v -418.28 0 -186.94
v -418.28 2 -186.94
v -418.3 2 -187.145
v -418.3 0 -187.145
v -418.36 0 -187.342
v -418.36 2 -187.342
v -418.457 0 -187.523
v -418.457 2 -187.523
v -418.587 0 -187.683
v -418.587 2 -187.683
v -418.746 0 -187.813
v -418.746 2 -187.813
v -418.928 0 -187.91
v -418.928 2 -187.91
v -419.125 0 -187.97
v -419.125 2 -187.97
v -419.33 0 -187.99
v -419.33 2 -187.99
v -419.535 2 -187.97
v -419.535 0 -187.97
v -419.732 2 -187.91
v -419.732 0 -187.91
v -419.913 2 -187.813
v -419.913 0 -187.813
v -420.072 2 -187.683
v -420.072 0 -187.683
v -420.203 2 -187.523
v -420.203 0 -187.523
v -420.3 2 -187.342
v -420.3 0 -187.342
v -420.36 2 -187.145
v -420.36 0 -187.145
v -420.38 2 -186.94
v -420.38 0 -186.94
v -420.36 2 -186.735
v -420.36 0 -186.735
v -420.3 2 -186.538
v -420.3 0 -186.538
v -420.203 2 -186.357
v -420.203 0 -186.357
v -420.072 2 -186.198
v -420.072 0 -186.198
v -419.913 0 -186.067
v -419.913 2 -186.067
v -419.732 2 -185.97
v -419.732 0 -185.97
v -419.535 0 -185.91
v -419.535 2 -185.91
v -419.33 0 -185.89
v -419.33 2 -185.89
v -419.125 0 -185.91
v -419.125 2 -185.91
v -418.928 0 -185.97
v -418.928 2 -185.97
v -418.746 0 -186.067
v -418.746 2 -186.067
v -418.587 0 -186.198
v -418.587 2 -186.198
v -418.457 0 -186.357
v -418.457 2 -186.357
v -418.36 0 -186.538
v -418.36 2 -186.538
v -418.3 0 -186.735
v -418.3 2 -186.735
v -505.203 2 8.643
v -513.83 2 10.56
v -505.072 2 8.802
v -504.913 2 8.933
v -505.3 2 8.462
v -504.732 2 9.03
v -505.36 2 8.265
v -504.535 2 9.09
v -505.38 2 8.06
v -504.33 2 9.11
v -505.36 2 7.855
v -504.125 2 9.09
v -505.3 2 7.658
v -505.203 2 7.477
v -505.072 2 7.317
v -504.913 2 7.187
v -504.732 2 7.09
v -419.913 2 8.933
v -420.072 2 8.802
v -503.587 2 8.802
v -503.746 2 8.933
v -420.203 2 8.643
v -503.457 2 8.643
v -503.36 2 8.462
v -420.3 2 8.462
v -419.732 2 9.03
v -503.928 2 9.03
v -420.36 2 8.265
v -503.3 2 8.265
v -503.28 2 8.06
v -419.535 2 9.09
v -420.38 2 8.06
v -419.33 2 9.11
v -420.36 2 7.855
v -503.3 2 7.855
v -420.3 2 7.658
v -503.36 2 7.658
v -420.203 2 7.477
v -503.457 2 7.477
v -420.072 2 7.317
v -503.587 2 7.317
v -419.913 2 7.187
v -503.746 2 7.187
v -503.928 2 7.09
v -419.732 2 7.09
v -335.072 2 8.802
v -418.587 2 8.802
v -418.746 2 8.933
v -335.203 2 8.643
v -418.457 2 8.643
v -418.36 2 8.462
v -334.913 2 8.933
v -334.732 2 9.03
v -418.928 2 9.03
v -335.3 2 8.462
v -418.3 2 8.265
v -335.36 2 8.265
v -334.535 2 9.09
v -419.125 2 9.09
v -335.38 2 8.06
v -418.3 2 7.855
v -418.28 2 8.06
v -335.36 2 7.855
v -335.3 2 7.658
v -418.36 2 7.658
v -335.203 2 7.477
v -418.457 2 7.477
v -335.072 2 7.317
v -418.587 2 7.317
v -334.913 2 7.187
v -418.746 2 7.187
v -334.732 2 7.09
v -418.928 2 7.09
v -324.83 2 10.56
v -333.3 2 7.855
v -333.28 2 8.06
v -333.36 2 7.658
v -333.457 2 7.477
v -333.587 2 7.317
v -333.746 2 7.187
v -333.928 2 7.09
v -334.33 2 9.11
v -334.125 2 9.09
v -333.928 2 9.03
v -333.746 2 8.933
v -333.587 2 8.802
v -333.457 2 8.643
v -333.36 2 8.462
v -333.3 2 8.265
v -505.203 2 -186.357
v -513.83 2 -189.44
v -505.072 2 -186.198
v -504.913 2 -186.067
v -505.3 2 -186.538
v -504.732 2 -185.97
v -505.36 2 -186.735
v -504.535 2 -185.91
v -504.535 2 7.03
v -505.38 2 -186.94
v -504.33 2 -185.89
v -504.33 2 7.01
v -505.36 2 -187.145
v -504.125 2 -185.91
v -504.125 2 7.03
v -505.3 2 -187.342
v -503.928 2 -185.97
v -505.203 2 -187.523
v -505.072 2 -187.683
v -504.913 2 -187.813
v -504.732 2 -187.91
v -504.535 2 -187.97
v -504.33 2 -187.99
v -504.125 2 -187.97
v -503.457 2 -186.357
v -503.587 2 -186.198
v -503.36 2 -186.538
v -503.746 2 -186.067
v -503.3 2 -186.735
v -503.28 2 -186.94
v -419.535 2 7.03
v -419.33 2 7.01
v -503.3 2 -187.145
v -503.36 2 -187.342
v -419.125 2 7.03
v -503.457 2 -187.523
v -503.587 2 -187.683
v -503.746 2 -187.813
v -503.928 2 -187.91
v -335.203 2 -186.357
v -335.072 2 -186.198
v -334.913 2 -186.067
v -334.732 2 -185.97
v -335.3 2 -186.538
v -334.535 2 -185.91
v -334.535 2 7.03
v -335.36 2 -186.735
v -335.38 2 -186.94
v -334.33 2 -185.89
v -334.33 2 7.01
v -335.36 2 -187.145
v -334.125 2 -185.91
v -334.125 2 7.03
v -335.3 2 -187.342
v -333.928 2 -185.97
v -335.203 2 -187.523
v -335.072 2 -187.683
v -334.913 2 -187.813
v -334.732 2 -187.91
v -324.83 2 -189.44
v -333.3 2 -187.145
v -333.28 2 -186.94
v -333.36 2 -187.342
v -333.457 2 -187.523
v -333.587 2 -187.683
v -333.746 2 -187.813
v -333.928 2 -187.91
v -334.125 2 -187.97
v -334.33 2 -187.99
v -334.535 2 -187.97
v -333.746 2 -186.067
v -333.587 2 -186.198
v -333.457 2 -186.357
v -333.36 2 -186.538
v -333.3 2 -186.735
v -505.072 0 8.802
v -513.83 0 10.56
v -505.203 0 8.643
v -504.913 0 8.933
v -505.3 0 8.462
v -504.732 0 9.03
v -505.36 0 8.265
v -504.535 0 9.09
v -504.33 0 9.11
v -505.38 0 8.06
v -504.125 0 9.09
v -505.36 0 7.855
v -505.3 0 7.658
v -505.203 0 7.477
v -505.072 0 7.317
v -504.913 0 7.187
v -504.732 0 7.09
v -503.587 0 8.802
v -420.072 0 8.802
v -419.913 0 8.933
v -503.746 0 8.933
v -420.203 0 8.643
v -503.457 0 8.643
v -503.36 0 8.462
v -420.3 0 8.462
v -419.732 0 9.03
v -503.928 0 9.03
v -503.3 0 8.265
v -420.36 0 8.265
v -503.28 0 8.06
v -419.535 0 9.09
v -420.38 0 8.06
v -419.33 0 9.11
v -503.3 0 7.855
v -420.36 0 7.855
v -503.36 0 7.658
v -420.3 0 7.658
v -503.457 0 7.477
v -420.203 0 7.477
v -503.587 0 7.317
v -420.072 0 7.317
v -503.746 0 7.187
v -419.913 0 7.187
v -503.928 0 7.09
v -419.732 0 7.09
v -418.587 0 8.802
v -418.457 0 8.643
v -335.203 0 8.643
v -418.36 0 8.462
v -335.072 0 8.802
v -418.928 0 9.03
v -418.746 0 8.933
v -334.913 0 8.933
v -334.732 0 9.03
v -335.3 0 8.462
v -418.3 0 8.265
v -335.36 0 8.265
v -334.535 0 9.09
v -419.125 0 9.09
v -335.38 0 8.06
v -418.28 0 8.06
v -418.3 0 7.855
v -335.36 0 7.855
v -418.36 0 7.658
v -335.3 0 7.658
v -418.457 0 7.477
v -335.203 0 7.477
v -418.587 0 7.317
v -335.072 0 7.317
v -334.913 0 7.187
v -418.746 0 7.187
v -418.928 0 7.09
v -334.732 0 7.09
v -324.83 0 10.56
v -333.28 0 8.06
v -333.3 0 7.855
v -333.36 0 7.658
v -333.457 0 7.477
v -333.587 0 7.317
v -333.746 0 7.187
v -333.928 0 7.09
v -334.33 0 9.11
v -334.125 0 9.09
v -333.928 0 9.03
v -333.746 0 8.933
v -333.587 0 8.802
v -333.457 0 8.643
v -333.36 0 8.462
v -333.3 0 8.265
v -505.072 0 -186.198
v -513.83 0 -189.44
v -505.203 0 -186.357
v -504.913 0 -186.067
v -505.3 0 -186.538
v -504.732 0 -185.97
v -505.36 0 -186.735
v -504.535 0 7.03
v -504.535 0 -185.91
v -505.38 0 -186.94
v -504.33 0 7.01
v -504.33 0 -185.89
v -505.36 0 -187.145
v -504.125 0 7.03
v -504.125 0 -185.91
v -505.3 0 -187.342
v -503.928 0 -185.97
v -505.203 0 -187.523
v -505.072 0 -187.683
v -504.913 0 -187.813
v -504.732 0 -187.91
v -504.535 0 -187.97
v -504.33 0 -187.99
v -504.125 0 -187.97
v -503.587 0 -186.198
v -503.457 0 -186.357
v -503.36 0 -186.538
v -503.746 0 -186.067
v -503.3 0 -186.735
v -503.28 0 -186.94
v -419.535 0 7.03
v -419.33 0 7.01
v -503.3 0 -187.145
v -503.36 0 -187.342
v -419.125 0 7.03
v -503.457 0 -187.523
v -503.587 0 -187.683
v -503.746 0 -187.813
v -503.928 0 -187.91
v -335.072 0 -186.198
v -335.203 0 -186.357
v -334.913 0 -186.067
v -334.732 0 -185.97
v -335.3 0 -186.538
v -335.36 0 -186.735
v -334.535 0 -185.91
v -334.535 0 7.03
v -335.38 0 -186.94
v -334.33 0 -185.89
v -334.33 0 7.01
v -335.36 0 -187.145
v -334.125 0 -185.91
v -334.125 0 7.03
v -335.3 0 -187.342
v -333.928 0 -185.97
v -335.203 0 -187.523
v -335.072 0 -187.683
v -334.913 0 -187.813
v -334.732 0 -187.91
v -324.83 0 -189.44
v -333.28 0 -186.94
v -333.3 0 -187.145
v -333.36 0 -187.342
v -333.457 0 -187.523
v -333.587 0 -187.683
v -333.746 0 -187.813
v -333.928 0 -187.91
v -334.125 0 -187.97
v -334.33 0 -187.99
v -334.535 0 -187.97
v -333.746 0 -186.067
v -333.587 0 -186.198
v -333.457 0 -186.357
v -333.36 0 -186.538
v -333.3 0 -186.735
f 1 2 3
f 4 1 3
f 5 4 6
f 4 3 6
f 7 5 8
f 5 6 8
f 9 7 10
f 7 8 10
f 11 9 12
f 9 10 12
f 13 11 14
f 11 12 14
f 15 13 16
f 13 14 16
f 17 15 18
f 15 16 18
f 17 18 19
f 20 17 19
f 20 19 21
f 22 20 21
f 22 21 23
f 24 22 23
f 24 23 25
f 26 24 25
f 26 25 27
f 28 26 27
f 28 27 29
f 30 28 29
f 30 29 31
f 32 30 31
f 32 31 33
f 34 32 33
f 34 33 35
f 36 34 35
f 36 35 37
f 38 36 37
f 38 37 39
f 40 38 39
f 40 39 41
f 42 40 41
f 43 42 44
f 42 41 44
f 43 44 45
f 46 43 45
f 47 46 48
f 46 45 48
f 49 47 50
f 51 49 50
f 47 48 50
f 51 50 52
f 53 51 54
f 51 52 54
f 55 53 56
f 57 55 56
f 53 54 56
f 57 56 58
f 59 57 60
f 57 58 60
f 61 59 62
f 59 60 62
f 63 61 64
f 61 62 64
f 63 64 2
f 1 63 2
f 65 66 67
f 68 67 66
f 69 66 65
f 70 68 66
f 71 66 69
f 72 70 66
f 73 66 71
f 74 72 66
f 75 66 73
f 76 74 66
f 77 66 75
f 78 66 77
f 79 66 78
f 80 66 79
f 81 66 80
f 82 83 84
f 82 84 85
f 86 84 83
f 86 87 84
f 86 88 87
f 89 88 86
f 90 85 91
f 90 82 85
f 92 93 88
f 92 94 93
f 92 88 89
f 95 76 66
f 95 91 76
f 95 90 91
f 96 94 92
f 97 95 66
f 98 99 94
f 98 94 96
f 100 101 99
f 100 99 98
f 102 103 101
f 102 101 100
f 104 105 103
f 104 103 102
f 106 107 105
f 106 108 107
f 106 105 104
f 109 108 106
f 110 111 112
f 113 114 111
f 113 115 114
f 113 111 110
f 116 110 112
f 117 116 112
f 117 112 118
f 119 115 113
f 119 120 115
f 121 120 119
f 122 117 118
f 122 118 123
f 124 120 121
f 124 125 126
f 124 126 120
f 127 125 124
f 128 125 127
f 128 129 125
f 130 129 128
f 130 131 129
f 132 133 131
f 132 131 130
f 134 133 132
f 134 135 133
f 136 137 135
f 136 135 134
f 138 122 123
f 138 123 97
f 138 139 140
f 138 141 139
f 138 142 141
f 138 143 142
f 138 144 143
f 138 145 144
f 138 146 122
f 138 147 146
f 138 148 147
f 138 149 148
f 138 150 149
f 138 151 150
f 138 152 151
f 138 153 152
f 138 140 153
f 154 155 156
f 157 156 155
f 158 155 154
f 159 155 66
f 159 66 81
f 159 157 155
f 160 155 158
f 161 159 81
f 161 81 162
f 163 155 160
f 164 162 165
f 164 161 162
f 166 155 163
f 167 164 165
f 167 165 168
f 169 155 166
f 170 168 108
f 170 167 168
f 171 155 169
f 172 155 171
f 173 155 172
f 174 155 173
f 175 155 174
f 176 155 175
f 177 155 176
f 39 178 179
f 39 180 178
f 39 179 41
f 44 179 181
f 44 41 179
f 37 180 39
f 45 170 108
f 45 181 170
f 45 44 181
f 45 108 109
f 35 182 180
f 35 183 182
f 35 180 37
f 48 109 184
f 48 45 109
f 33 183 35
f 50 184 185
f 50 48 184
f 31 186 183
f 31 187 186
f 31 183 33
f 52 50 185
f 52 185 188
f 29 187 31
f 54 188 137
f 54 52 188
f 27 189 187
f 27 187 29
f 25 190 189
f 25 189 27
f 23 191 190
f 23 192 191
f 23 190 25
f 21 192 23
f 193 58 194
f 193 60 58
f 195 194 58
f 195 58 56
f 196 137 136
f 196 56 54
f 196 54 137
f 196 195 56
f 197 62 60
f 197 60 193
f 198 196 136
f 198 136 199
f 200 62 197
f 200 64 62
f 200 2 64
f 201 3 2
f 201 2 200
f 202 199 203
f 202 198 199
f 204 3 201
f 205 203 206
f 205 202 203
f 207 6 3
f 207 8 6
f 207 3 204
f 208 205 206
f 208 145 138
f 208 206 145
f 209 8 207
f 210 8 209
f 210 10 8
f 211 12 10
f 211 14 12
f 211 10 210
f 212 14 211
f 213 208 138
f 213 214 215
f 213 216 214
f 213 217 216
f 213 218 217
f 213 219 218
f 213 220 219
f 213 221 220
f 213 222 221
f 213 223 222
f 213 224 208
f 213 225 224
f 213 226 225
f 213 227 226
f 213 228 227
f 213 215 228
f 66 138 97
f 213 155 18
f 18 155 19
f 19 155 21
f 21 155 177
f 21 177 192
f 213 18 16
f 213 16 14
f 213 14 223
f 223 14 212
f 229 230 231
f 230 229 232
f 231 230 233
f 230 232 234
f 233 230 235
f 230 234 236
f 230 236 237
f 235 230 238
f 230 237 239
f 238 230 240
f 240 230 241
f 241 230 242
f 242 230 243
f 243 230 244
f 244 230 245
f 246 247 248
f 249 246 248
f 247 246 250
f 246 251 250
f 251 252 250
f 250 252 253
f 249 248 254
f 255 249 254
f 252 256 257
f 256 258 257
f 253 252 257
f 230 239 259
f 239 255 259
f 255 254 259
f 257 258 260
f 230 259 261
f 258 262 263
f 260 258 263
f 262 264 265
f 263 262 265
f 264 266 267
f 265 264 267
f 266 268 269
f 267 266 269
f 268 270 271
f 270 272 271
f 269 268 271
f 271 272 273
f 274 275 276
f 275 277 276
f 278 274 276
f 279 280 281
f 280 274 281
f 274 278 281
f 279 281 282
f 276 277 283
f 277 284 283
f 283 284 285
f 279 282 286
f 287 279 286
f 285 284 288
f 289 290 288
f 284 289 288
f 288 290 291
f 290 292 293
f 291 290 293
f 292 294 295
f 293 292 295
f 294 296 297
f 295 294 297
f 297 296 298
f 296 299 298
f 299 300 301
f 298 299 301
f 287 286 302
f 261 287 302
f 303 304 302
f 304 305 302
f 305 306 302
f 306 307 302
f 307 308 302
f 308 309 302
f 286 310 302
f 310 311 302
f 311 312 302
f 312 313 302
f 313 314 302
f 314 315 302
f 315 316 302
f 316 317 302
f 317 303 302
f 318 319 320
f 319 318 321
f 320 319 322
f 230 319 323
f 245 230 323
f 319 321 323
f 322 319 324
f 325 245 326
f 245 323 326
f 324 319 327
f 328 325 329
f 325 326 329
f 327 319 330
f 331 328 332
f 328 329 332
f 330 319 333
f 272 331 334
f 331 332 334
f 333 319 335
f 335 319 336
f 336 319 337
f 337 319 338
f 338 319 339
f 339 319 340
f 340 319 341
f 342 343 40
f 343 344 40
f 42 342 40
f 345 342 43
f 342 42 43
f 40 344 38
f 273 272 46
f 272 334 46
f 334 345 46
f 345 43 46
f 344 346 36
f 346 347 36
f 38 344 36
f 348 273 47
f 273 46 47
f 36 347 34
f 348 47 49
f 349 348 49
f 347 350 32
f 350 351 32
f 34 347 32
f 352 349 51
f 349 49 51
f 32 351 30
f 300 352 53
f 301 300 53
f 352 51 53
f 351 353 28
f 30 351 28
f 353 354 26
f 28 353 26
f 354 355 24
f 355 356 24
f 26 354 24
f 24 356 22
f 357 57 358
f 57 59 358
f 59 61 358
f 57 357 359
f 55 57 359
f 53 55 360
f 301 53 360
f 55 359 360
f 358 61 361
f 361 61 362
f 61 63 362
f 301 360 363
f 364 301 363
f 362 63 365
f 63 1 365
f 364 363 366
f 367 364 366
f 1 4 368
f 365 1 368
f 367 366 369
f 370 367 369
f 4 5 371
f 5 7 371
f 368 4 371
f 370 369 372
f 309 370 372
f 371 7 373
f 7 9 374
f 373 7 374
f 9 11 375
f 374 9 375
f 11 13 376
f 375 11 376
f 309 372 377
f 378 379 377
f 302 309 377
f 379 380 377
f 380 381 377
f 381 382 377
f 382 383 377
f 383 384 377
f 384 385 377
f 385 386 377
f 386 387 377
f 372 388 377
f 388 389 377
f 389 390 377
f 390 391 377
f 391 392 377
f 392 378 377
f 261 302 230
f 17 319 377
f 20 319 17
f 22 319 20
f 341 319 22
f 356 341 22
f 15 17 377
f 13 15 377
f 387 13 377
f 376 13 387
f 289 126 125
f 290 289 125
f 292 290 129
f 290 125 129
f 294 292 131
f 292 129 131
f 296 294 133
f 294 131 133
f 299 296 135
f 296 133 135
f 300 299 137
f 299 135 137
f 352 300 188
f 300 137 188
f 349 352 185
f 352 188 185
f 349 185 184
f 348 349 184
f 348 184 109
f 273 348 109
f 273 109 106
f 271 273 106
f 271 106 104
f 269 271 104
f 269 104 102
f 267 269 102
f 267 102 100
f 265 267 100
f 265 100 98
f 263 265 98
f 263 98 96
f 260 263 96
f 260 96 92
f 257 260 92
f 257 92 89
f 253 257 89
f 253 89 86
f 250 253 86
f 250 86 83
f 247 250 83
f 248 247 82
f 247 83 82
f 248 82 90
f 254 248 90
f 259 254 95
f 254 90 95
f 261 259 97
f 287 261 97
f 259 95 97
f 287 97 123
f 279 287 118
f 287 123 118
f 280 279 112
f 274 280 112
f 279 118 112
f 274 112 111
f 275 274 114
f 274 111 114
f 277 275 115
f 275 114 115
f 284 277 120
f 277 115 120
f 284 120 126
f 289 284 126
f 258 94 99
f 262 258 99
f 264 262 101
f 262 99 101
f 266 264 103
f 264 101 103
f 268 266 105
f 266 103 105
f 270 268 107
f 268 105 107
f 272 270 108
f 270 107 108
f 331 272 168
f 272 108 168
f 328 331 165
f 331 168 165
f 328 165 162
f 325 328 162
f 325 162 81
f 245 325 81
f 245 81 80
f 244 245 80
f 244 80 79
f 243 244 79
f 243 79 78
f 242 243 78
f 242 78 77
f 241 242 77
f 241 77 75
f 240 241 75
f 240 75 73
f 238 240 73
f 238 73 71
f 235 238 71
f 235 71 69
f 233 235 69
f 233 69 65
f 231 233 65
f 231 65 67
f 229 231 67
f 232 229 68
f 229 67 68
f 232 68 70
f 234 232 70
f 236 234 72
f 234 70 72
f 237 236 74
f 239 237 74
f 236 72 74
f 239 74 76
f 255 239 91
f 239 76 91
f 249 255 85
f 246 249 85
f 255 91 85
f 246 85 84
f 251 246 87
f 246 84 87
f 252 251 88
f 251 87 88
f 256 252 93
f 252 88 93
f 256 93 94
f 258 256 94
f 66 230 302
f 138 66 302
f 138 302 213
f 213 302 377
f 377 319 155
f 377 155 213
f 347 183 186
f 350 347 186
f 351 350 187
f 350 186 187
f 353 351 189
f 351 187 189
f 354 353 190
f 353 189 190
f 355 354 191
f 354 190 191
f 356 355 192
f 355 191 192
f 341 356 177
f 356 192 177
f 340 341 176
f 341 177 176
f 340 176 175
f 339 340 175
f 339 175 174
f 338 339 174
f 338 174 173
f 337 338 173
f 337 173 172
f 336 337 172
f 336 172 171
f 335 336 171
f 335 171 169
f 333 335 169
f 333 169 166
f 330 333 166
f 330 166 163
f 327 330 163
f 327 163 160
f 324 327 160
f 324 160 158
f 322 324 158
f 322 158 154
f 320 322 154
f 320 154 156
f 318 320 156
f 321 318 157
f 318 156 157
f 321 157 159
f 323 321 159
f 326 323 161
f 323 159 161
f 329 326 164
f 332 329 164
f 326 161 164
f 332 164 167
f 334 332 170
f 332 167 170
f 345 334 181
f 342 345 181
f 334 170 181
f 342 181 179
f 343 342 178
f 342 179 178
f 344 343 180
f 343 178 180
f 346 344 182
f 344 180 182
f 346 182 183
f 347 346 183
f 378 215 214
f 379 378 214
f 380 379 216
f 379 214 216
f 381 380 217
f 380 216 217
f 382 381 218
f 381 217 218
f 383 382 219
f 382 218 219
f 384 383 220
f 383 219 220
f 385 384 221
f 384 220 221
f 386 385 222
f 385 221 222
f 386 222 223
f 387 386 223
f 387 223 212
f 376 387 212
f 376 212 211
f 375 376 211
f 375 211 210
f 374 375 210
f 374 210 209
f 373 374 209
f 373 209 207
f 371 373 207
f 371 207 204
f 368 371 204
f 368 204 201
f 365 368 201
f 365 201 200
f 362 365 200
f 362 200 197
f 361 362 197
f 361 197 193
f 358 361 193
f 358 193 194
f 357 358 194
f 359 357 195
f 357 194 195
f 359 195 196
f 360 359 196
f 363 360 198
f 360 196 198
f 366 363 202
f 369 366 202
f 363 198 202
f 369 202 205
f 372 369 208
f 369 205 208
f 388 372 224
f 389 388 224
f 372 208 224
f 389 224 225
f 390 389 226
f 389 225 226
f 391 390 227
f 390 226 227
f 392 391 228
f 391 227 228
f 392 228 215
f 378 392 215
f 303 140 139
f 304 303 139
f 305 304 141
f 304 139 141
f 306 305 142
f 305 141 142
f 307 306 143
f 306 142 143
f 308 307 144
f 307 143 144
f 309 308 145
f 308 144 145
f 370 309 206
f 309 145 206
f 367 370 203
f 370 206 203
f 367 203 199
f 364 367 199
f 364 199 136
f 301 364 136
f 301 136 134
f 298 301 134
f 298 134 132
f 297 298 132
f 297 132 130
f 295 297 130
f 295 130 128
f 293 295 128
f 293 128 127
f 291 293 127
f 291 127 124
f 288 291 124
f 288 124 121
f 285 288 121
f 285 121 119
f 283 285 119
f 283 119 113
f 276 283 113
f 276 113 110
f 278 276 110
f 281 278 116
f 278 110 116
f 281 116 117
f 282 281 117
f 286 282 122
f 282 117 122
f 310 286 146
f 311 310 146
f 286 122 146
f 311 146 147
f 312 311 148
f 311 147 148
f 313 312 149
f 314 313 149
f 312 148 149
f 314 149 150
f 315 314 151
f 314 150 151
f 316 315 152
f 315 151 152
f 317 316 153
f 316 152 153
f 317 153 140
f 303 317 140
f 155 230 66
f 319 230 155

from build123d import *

# Parameters (mm, degrees)
SKETCH_1_W                  = 189
SKETCH_1_H                  = 200
EXTRUDE_1_DEPTH             = 2
SKETCH_2_R                  = 1.05
CUT_EXTRUDE_1_DEPTH         = 10
PATTERN_LINEAR_1_COUNT      = 2
PATTERN_LINEAR_1_PITCH      = 195
PATTERN_LINEAR_1_COUNT_DIR2 = 3
PATTERN_LINEAR_1_PITCH_DIR2 = 85


with BuildPart() as part:
    # 草图1 → 凸台-拉伸1 (new body)
    with BuildSketch(Plane(origin=(0, 0, 0), x_dir=(1, 0, 0), z_dir=(0, 1, 0))):
        with Locations((-419.32983733, 89.440084541)):
            Rectangle(SKETCH_1_W, SKETCH_1_H)
    extrude(amount=EXTRUDE_1_DEPTH)

    # 草图2 → 切除-拉伸1 (cut)
    with BuildSketch(Plane(origin=(0, 2, 0), x_dir=(1, 0, 0), z_dir=(0, 1, 0))):
        with Locations((-504.32983733, -8.059915459)):
            Circle(SKETCH_2_R)
    cut_extrude_1 = extrude(amount=-CUT_EXTRUDE_1_DEPTH, mode=Mode.SUBTRACT)

    # 阵列(线性)1: Cut-Extrude 1 2 × 3
    with Locations(*[(j * PATTERN_LINEAR_1_PITCH_DIR2, 0, -i * PATTERN_LINEAR_1_PITCH) for i in range(PATTERN_LINEAR_1_COUNT) for j in range(PATTERN_LINEAR_1_COUNT_DIR2) if (i, j) != (0, 0)]):
        add(cut_extrude_1, mode=Mode.SUBTRACT)


solid = part.part
